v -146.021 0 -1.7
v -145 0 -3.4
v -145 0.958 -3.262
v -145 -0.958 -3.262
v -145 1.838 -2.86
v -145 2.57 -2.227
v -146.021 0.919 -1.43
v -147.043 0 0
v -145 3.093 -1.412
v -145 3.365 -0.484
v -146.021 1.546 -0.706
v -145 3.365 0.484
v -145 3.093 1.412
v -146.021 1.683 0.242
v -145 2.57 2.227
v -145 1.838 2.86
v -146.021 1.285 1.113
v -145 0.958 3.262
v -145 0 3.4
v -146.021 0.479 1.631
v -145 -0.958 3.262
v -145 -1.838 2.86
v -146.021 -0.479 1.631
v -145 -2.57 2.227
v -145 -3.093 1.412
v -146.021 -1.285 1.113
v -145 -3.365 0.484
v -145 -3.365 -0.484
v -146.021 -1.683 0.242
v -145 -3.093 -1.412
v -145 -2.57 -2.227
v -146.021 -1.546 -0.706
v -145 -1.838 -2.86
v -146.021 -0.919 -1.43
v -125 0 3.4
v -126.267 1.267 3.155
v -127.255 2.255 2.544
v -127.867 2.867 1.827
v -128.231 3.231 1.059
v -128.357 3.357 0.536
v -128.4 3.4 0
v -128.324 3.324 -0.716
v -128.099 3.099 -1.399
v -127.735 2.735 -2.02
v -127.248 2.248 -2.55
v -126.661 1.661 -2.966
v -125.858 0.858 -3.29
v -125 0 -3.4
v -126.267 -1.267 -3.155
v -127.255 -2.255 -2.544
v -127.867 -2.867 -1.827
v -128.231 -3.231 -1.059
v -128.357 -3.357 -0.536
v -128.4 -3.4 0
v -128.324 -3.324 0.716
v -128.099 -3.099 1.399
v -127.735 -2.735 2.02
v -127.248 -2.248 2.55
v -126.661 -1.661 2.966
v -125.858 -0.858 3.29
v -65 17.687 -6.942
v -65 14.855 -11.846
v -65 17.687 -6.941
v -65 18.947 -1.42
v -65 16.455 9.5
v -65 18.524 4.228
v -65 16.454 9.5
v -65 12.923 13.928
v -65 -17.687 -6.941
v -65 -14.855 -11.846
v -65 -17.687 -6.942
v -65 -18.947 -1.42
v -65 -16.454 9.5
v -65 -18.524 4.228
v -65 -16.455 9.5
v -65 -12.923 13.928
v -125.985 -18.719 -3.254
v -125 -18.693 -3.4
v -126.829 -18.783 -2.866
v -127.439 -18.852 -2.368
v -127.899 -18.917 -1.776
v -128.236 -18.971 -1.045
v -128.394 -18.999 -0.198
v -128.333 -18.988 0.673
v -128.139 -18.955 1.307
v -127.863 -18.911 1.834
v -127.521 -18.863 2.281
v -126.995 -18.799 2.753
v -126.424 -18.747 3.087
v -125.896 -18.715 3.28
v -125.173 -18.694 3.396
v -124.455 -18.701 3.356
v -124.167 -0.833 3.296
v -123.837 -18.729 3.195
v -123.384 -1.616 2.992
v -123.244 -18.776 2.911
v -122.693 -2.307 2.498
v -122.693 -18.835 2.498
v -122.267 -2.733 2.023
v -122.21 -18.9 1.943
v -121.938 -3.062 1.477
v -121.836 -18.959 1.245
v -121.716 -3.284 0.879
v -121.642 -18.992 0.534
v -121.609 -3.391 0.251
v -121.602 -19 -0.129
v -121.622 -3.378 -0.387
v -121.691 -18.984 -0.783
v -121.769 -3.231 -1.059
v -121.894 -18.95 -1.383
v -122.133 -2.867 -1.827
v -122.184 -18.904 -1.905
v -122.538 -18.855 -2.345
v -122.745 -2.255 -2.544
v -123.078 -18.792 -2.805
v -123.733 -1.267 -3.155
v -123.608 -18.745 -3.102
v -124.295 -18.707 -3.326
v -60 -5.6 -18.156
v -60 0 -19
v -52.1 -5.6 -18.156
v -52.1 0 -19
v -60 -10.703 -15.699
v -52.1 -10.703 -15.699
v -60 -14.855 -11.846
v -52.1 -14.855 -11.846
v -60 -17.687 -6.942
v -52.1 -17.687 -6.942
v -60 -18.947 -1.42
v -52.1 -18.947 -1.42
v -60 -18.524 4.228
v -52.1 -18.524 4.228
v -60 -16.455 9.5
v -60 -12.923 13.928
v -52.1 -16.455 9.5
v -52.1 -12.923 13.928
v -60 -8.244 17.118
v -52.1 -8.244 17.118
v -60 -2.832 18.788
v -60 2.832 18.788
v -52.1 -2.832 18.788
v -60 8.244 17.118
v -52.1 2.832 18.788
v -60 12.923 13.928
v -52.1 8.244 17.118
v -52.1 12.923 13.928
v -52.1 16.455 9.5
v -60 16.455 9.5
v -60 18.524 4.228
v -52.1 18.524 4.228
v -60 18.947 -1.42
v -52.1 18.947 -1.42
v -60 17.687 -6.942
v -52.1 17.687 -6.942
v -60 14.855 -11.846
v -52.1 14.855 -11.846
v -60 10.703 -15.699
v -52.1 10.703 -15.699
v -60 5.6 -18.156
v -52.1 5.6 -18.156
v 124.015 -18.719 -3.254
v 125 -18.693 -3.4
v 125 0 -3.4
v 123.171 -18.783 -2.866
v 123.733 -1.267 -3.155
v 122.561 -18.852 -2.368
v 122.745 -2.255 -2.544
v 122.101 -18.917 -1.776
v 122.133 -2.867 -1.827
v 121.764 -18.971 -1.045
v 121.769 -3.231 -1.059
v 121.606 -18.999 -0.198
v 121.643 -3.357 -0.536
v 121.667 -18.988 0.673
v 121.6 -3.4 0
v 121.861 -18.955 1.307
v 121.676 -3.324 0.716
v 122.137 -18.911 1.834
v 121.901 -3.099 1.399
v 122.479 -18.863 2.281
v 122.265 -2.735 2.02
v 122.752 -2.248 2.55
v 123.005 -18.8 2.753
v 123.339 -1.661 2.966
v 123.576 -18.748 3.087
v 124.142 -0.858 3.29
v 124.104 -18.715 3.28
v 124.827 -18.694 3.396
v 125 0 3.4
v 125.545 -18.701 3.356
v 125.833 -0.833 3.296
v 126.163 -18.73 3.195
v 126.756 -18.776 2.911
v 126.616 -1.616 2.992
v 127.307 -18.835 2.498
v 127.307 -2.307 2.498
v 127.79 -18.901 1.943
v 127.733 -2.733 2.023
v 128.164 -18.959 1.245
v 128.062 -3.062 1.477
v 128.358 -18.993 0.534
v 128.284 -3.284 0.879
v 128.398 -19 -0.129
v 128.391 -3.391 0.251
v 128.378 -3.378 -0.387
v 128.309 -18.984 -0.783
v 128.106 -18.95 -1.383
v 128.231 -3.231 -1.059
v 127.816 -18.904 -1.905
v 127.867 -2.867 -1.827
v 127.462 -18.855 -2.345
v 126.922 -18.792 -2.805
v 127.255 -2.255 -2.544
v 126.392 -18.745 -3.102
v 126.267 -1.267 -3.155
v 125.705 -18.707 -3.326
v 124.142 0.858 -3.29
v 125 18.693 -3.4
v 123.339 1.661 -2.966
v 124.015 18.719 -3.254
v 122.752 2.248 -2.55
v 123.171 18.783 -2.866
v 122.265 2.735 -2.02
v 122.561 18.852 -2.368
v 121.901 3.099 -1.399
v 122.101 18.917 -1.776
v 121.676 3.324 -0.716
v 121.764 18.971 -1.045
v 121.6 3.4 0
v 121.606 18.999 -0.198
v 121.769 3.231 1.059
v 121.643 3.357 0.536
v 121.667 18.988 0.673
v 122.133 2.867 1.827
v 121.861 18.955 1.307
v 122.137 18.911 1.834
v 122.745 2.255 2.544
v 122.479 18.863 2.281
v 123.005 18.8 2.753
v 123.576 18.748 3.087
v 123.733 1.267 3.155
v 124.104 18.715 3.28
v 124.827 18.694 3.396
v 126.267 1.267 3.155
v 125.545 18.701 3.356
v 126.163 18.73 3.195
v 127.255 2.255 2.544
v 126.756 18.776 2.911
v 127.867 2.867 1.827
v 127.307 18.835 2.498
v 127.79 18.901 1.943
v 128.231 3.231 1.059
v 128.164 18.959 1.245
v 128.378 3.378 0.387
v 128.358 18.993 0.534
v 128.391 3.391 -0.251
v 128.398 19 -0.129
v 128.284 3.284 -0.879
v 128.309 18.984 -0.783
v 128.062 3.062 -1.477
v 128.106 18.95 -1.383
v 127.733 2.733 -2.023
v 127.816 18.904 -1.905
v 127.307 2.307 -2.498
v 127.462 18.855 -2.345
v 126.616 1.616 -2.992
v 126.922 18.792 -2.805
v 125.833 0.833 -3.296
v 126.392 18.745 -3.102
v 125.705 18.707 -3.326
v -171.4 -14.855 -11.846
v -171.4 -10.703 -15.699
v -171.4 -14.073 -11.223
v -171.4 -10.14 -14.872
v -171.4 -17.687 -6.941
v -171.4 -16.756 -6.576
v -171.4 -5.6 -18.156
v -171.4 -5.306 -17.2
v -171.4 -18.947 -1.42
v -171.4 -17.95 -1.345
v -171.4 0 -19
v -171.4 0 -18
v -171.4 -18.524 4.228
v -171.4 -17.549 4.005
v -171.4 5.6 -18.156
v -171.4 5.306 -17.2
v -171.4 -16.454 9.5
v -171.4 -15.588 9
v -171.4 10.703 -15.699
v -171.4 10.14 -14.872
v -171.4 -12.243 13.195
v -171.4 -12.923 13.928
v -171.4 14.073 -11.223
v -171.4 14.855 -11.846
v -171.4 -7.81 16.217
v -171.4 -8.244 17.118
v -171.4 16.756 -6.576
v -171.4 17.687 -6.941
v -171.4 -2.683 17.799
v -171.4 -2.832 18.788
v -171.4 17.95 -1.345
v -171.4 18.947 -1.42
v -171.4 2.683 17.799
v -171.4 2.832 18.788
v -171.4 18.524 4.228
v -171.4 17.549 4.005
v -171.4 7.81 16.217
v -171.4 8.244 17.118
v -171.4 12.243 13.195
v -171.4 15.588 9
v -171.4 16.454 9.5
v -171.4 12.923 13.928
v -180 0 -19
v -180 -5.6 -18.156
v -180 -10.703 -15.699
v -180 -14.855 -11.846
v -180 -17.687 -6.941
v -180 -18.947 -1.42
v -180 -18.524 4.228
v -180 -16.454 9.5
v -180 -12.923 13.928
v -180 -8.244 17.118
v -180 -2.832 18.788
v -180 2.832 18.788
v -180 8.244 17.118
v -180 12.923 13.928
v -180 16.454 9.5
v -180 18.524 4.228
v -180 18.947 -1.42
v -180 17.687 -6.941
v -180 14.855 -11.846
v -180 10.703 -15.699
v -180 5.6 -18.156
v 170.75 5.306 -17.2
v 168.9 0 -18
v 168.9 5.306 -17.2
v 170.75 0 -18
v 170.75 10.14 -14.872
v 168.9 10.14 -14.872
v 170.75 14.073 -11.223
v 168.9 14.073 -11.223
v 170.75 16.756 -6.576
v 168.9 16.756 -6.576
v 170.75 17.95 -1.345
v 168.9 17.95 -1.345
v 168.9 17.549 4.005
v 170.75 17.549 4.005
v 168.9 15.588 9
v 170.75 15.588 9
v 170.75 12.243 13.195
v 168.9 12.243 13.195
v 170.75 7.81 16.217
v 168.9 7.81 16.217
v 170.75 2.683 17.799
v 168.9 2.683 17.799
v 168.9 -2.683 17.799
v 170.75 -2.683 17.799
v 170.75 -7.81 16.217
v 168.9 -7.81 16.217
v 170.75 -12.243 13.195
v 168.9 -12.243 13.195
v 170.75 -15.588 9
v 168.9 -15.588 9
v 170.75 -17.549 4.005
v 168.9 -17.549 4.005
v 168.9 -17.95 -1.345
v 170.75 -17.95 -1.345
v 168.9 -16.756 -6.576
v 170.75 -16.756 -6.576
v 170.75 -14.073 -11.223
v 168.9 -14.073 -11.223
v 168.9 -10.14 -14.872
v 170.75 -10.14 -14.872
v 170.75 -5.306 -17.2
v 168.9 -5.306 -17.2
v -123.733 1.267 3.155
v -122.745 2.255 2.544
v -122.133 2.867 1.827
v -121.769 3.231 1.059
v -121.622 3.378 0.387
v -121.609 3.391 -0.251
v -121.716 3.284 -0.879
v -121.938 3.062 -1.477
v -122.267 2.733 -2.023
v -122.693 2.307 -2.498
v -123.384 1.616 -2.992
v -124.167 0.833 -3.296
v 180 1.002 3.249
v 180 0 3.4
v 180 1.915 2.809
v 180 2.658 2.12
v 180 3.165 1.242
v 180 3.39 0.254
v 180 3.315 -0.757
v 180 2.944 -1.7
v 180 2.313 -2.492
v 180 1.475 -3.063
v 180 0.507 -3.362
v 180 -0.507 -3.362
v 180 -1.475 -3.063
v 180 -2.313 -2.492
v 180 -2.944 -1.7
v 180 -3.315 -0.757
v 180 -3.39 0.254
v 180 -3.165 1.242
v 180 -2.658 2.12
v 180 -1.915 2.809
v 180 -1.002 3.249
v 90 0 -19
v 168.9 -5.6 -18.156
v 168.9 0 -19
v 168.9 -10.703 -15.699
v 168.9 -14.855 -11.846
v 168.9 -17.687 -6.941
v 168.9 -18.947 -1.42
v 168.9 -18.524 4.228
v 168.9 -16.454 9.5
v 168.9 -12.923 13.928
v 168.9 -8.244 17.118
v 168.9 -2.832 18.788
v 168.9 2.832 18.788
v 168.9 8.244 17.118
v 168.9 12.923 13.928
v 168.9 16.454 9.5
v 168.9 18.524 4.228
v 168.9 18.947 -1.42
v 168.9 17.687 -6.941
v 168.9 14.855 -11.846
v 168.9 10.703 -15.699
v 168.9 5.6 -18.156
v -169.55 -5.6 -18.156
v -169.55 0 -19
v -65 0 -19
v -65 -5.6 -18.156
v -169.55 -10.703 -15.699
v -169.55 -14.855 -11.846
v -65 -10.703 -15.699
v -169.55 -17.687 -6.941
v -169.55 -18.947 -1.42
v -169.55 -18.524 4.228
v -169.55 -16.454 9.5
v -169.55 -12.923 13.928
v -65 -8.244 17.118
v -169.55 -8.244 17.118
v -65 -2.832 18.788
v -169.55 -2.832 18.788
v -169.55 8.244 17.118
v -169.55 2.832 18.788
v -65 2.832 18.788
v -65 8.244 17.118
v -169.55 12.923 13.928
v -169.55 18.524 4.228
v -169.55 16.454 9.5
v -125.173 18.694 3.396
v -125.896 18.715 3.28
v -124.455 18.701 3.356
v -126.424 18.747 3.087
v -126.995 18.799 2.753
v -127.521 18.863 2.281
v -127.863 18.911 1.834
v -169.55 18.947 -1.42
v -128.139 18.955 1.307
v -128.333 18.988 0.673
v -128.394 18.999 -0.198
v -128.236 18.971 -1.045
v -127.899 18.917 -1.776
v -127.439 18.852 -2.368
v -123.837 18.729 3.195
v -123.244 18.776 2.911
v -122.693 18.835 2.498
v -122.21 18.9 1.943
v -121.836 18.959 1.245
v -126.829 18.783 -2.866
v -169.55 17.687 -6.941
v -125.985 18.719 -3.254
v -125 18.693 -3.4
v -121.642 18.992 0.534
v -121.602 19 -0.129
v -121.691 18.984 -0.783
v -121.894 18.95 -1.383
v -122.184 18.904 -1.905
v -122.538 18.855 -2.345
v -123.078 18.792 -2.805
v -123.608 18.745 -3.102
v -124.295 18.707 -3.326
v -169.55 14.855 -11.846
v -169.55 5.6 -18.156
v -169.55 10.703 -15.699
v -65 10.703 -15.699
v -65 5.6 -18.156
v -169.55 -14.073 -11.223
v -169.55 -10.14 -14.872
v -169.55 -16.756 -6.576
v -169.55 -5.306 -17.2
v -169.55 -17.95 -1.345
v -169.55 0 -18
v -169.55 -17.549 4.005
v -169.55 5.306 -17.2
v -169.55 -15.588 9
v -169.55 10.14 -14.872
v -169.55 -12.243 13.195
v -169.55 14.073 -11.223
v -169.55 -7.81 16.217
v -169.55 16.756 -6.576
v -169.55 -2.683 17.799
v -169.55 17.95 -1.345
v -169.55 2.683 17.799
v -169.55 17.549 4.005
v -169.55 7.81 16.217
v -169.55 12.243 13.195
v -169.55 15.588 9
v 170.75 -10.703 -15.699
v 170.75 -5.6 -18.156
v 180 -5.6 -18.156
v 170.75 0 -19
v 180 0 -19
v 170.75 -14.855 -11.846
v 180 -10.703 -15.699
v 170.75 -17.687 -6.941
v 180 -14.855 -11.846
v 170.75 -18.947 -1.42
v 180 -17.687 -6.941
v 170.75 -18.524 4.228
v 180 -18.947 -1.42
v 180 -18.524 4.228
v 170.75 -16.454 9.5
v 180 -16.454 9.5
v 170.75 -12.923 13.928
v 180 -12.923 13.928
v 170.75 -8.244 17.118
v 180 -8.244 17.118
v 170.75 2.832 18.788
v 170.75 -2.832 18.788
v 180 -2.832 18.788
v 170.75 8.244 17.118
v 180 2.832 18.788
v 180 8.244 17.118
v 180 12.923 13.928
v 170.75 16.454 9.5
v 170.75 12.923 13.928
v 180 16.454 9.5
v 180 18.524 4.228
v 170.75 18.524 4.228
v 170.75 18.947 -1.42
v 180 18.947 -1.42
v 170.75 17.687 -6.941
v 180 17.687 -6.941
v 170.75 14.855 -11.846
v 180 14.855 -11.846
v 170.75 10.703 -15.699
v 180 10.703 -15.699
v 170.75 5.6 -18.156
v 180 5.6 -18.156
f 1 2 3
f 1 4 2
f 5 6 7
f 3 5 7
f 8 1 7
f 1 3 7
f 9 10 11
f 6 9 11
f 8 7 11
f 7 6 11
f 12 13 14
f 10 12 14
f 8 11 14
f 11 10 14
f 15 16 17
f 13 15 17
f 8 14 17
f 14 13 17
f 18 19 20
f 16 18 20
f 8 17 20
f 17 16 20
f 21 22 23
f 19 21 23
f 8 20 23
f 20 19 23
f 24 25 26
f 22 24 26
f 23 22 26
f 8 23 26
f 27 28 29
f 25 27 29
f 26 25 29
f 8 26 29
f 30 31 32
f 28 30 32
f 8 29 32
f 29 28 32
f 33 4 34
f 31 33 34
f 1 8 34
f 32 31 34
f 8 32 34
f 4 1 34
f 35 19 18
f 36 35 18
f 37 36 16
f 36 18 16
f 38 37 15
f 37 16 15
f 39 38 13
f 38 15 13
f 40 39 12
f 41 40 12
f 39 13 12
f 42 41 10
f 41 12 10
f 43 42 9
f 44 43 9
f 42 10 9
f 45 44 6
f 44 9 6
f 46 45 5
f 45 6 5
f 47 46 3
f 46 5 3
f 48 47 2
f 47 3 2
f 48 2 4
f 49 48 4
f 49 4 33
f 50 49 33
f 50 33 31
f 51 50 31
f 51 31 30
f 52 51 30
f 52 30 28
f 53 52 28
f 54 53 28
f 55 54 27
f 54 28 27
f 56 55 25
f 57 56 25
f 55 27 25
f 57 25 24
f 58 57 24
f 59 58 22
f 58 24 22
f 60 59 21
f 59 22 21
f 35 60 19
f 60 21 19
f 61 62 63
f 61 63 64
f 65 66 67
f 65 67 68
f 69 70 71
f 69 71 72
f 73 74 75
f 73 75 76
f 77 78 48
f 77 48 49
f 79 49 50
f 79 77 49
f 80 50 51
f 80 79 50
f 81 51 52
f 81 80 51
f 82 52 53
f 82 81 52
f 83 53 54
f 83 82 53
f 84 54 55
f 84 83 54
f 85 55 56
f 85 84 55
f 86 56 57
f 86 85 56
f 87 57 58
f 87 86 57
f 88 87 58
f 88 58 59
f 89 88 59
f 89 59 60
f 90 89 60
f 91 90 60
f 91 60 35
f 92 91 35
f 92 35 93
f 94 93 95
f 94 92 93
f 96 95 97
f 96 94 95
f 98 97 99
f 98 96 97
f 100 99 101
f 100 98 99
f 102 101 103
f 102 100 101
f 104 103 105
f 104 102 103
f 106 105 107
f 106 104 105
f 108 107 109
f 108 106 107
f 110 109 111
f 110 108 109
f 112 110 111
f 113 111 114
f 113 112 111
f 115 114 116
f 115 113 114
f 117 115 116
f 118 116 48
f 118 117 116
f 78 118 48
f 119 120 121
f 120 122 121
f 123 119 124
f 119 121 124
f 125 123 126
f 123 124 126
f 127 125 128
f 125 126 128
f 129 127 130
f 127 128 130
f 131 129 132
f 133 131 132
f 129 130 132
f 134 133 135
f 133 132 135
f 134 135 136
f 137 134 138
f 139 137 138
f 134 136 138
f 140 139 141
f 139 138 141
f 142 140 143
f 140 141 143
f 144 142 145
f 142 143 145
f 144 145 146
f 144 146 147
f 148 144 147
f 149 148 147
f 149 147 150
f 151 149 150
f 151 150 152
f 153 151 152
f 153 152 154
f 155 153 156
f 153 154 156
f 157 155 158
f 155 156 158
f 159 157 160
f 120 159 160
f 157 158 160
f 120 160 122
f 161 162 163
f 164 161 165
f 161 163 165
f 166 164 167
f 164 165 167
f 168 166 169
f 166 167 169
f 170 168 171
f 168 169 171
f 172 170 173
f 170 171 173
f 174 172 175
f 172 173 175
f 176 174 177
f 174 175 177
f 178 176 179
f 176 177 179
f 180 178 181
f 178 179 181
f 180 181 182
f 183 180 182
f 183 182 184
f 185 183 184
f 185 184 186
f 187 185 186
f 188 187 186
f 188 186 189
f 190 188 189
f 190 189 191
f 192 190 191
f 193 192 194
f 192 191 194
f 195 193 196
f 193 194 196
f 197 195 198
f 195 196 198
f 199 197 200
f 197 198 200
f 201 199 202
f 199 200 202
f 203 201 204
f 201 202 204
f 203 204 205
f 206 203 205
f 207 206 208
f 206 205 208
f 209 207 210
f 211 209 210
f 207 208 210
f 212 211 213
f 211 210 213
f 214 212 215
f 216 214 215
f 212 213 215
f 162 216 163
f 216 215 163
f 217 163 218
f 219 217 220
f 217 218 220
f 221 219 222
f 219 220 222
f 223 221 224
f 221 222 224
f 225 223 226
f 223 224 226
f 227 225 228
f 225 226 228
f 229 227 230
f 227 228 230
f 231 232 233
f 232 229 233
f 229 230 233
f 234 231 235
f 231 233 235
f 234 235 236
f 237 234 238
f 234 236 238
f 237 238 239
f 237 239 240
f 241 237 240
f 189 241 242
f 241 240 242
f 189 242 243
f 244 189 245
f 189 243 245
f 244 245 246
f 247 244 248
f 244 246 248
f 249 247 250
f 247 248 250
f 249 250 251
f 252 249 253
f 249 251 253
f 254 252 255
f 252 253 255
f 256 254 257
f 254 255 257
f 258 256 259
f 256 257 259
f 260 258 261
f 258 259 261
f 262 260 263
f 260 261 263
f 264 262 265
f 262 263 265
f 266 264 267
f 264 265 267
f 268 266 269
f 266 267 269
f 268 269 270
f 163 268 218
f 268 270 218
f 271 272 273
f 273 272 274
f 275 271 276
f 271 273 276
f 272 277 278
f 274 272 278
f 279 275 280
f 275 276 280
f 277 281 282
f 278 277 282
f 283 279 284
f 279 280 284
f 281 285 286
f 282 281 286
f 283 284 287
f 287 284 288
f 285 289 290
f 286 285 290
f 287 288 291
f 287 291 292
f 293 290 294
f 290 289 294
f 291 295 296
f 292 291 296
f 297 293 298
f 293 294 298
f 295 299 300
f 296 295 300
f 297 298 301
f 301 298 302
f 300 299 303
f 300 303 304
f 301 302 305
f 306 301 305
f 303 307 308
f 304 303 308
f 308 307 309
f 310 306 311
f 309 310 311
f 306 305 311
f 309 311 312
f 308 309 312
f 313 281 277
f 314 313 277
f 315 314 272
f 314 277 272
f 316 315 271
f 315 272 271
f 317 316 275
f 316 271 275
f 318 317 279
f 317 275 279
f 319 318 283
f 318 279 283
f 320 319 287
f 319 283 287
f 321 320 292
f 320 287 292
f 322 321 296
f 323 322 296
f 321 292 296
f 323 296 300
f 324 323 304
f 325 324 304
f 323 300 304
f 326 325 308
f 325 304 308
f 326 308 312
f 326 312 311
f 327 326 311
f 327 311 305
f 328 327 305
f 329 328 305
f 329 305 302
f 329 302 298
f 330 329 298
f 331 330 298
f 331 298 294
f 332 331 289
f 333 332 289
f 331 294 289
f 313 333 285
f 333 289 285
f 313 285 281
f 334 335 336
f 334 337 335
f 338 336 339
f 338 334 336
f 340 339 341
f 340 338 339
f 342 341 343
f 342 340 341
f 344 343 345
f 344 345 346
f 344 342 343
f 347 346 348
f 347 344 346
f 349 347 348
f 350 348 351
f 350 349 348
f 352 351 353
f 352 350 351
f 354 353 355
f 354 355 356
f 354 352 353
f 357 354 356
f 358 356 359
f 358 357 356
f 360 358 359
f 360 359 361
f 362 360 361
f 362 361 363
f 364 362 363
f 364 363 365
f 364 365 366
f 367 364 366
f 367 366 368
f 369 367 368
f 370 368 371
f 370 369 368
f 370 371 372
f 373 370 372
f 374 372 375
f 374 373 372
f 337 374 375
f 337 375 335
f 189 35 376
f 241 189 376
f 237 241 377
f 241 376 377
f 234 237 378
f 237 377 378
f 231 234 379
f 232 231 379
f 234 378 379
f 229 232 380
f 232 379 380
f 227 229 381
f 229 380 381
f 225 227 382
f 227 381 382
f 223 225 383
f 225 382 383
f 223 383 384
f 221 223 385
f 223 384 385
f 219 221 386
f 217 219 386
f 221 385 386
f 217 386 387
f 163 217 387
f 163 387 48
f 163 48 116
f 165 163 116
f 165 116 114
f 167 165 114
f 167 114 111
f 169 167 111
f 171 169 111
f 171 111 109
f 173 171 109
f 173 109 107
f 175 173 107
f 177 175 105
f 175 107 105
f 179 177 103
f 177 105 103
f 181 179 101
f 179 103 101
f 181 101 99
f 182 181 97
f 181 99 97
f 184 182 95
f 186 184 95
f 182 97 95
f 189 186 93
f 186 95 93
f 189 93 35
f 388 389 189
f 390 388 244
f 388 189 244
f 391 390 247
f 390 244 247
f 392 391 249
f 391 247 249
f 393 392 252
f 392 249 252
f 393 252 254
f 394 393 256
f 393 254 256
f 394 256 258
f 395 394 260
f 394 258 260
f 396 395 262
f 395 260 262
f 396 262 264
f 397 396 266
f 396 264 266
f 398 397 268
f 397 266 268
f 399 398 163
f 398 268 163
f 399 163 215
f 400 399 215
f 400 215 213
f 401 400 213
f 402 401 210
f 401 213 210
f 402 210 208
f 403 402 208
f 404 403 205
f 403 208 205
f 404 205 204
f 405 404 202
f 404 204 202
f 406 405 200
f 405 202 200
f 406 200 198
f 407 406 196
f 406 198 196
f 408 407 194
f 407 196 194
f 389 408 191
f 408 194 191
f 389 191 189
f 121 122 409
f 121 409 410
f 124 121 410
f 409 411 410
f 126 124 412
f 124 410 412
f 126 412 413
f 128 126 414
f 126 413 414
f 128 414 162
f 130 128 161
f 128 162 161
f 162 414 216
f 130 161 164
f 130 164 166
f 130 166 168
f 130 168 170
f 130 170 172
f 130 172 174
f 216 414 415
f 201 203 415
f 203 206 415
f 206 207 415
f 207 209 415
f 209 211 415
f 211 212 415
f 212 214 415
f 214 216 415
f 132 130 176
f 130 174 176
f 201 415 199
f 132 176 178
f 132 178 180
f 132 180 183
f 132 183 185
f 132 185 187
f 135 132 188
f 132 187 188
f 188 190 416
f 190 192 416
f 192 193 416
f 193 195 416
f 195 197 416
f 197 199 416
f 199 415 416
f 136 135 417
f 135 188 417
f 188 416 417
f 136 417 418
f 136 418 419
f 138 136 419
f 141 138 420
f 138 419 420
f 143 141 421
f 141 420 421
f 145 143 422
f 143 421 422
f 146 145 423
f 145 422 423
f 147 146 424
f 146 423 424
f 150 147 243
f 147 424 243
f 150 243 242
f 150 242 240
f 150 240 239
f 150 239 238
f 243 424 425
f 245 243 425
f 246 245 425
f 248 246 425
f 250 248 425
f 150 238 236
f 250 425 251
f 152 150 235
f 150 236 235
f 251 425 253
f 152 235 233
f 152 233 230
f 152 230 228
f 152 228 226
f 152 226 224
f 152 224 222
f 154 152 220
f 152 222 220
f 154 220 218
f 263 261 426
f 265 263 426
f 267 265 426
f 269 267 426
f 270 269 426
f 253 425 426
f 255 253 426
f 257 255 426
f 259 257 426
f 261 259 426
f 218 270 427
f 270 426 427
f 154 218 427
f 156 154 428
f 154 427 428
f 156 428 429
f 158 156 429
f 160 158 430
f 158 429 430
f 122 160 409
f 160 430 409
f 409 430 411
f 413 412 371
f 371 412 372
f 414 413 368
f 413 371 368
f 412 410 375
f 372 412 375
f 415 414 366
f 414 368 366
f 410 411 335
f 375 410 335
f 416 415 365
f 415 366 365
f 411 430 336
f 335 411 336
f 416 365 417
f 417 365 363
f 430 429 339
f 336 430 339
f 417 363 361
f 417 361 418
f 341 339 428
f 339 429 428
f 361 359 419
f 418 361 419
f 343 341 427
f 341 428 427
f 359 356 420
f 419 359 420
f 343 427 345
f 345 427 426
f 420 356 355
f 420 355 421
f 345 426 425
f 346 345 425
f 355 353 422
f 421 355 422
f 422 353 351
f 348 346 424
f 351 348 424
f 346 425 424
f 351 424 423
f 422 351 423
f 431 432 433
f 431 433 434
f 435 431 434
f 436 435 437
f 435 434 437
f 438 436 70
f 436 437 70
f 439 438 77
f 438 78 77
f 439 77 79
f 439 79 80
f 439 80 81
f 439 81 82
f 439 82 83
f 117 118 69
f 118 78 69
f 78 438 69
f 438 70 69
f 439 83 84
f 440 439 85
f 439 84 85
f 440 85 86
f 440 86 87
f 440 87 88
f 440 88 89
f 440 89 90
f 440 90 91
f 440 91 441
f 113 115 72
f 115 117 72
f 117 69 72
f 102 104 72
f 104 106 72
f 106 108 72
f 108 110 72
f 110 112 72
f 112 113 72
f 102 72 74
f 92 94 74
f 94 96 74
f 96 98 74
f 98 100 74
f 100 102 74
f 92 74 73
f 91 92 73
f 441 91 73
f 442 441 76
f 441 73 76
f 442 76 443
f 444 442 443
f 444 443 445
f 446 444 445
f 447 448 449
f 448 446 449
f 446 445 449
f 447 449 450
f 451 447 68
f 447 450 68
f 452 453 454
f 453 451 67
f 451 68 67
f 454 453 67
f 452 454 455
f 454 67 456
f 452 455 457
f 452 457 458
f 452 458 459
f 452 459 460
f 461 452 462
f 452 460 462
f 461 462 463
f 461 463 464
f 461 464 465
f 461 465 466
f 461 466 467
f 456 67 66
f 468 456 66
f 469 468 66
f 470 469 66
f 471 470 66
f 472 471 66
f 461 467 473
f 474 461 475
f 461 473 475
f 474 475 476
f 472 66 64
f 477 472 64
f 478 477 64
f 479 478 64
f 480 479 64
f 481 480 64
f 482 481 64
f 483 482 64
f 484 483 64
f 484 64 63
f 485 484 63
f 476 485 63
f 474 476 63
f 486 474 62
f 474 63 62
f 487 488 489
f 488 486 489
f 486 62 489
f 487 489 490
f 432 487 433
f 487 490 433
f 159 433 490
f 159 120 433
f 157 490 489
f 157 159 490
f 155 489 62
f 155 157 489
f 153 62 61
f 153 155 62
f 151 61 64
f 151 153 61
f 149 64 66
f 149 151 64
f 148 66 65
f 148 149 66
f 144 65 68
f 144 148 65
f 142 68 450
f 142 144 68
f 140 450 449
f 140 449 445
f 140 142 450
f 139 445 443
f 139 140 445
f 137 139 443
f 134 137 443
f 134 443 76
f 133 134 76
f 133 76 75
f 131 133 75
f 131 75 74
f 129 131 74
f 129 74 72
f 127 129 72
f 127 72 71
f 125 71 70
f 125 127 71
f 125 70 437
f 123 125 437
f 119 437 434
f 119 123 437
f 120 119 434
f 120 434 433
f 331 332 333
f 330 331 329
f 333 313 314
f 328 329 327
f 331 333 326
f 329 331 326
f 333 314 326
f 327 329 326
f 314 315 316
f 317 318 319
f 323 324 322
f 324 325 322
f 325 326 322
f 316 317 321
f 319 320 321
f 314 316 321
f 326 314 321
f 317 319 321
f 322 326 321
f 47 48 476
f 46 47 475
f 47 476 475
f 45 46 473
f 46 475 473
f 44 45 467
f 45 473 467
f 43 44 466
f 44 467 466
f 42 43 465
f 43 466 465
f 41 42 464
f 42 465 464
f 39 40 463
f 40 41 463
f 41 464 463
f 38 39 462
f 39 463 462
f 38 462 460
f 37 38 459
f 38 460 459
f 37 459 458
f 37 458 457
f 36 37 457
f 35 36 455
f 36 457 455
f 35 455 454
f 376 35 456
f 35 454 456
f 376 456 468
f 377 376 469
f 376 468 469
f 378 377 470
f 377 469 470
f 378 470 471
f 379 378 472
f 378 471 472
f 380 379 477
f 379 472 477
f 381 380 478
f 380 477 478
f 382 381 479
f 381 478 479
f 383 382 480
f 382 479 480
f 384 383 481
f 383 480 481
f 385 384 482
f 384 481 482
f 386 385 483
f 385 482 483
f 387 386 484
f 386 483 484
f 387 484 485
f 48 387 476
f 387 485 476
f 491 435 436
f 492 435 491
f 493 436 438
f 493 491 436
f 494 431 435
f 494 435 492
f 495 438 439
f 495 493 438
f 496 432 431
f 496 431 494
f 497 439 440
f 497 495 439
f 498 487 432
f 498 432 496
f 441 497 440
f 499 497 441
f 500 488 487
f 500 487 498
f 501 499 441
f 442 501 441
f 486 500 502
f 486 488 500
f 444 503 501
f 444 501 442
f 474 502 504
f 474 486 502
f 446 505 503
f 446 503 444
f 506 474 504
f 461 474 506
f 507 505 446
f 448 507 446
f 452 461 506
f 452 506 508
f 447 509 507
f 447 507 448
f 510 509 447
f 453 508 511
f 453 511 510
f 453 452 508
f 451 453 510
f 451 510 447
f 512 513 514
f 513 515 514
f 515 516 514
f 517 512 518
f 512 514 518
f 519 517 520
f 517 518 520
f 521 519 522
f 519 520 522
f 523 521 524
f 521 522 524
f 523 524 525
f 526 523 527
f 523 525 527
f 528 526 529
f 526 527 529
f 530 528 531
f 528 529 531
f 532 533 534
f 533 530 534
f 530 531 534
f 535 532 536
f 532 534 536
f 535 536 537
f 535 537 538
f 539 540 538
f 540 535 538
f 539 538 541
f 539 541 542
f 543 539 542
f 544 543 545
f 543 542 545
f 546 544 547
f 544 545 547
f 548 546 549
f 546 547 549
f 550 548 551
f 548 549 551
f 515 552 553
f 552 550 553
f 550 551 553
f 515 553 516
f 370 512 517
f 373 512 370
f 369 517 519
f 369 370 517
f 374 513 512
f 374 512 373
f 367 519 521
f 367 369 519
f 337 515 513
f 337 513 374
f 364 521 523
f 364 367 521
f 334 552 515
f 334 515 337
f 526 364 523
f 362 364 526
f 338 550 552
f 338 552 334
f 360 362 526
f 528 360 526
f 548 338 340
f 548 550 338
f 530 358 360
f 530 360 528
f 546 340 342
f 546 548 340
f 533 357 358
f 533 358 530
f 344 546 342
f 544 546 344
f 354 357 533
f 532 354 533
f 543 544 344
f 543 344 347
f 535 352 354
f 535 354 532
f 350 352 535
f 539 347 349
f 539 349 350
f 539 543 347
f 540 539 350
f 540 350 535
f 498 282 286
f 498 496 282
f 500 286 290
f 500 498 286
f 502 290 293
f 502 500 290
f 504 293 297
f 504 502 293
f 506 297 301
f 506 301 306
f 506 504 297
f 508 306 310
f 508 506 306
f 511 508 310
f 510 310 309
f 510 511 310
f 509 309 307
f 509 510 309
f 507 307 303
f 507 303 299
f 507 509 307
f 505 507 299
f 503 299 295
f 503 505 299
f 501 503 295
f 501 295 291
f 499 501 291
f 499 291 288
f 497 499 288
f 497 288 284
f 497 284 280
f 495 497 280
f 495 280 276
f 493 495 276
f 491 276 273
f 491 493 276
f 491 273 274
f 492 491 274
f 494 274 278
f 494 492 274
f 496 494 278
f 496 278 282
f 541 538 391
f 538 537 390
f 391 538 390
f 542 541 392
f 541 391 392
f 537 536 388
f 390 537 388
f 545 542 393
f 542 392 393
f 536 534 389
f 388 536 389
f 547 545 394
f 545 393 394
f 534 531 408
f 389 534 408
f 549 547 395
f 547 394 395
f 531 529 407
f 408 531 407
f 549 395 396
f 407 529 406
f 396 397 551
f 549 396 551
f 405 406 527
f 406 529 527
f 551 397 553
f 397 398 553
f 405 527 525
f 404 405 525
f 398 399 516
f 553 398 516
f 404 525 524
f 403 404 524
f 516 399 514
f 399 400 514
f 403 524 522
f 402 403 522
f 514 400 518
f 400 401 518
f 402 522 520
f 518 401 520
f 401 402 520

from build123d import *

# Parameters (mm, degrees)
M8_GEWINDEBOHRUNG1_D          = 6.8
M8_GEWINDEBOHRUNG1_DEPTH      = 325
M8_GEWINDEBOHRUNG1_TIP        = 2.042926105
SKIZZE18_W                    = 3.4
SKIZZE18_H                    = 27
M8_GEWINDEBOHRUNG3_AT_2_COUNT = 2
M8_GEWINDEBOHRUNG3_AT_2_PITCH = 250
SPIEGELN2_COPY_1_SKETCH_W     = 3.4
SPIEGELN2_COPY_1_SKETCH_H     = 27
SKIZZE19_W                    = 1.85
SKIZZE19_H                    = 1
SKIZZE20_W                    = 1.85
SKIZZE20_H                    = 1
SKETCH1_W                     = 21.407583332
SKETCH1_H                     = 15.084330907


with BuildPart() as part:
    # Skizze1 → Rotation1 (revolve)
    with BuildSketch(Plane.XY, mode=Mode.PRIVATE) as rotation1_sk:
        Polygon((180, 19), (180, 0), (-180, 0), (-180, 19), (-65, 19), (-65, 27), (-60, 27), (-60, 19.0001), (90, 19.0001), align=None)
    revolve(rotation1_sk.sketch.rotate(Axis((180, 0, 0), (-1, 0, 0)), 90), axis=Axis((180, 0, 0), (-1, 0, 0)))

    # M8 Gewindebohrung1
    with Locations(Plane(origin=(180, 0, 0), x_dir=(0, 0, -1), z_dir=(1, 0, 0))):
        with Locations((0, 0)):
            Hole(M8_GEWINDEBOHRUNG1_D / 2, depth=M8_GEWINDEBOHRUNG1_DEPTH)
            with Locations((0, 0, -(M8_GEWINDEBOHRUNG1_DEPTH + M8_GEWINDEBOHRUNG1_TIP / 2))):  # 118° drill point
                Cone(0, M8_GEWINDEBOHRUNG1_D / 2, M8_GEWINDEBOHRUNG1_TIP, mode=Mode.SUBTRACT)

    # Skizze18 → M8 Gewindebohrung3 (revolve, cut)
    with BuildSketch(Plane(origin=(-125, 0, 0), x_dir=(0, 0, -1), z_dir=(1, 0, 0))):
        with Locations((1.7, 13.5)):
            Rectangle(SKIZZE18_W, SKIZZE18_H)
    m8_gewindebohrung3 = revolve(axis=Axis((-125, -6.35, 0), (0, 1, 0)), mode=Mode.SUBTRACT)

    # M8 Gewindebohrung3 at 2: M8 Gewindebohrung3 ×2
    with Locations(*[(i * M8_GEWINDEBOHRUNG3_AT_2_PITCH, 0, 0) for i in range(1, M8_GEWINDEBOHRUNG3_AT_2_COUNT)]):
        add(m8_gewindebohrung3, mode=Mode.SUBTRACT)

    # Spiegeln2: M8 Gewindebohrung3 across plane
    add(m8_gewindebohrung3.mirror(Plane.ZX), mode=Mode.SUBTRACT)

    # Spiegeln2 copy 1 sketch → Spiegeln2 copy 1 (revolve, cut)
    with BuildSketch(Plane(origin=(125, 0, 0), x_dir=(0, 0, -1), z_dir=(1, 0, 0))):
        with Locations((1.7, -13.5)):
            Rectangle(SPIEGELN2_COPY_1_SKETCH_W, SPIEGELN2_COPY_1_SKETCH_H)
    revolve(axis=Axis((125, 6.35, 0), (0, 1, 0)), mode=Mode.SUBTRACT)

    # Skizze19 → Schnitt-Rotation1 (revolve, cut)
    with BuildSketch(Plane.XY, mode=Mode.PRIVATE) as schnitt_rotation1_sk:
        with Locations((169.825, 18.5)):
            Rectangle(SKIZZE19_W, SKIZZE19_H)
    revolve(schnitt_rotation1_sk.sketch.rotate(Axis((-88.99, 0, 0), (1, 0, 0)), 270), axis=Axis((-88.99, 0, 0), (1, 0, 0)), mode=Mode.SUBTRACT)

    # Skizze20 → Schnitt-Rotation2 (revolve, cut)
    with BuildSketch(Plane.XY, mode=Mode.PRIVATE) as schnitt_rotation2_sk:
        with Locations((-170.475, 18.5)):
            Rectangle(SKIZZE20_W, SKIZZE20_H)
    revolve(schnitt_rotation2_sk.sketch.rotate(Axis((-88.99, 0, 0), (1, 0, 0)), 270), axis=Axis((-88.99, 0, 0), (1, 0, 0)), mode=Mode.SUBTRACT)

    # Sketch1 → Cut-Revolve1 (revolve, cut)
    with BuildSketch(Plane.XY, mode=Mode.PRIVATE) as cut_revolve1_sk:
        with Locations((-62.803513507, 26.542265454)):
            Rectangle(SKETCH1_W, SKETCH1_H)
    revolve(cut_revolve1_sk.sketch.rotate(Axis((-202.232213843, 0, 0), (1, 0, 0)), 270), axis=Axis((-202.232213843, 0, 0), (1, 0, 0)), mode=Mode.SUBTRACT)


solid = part.part
